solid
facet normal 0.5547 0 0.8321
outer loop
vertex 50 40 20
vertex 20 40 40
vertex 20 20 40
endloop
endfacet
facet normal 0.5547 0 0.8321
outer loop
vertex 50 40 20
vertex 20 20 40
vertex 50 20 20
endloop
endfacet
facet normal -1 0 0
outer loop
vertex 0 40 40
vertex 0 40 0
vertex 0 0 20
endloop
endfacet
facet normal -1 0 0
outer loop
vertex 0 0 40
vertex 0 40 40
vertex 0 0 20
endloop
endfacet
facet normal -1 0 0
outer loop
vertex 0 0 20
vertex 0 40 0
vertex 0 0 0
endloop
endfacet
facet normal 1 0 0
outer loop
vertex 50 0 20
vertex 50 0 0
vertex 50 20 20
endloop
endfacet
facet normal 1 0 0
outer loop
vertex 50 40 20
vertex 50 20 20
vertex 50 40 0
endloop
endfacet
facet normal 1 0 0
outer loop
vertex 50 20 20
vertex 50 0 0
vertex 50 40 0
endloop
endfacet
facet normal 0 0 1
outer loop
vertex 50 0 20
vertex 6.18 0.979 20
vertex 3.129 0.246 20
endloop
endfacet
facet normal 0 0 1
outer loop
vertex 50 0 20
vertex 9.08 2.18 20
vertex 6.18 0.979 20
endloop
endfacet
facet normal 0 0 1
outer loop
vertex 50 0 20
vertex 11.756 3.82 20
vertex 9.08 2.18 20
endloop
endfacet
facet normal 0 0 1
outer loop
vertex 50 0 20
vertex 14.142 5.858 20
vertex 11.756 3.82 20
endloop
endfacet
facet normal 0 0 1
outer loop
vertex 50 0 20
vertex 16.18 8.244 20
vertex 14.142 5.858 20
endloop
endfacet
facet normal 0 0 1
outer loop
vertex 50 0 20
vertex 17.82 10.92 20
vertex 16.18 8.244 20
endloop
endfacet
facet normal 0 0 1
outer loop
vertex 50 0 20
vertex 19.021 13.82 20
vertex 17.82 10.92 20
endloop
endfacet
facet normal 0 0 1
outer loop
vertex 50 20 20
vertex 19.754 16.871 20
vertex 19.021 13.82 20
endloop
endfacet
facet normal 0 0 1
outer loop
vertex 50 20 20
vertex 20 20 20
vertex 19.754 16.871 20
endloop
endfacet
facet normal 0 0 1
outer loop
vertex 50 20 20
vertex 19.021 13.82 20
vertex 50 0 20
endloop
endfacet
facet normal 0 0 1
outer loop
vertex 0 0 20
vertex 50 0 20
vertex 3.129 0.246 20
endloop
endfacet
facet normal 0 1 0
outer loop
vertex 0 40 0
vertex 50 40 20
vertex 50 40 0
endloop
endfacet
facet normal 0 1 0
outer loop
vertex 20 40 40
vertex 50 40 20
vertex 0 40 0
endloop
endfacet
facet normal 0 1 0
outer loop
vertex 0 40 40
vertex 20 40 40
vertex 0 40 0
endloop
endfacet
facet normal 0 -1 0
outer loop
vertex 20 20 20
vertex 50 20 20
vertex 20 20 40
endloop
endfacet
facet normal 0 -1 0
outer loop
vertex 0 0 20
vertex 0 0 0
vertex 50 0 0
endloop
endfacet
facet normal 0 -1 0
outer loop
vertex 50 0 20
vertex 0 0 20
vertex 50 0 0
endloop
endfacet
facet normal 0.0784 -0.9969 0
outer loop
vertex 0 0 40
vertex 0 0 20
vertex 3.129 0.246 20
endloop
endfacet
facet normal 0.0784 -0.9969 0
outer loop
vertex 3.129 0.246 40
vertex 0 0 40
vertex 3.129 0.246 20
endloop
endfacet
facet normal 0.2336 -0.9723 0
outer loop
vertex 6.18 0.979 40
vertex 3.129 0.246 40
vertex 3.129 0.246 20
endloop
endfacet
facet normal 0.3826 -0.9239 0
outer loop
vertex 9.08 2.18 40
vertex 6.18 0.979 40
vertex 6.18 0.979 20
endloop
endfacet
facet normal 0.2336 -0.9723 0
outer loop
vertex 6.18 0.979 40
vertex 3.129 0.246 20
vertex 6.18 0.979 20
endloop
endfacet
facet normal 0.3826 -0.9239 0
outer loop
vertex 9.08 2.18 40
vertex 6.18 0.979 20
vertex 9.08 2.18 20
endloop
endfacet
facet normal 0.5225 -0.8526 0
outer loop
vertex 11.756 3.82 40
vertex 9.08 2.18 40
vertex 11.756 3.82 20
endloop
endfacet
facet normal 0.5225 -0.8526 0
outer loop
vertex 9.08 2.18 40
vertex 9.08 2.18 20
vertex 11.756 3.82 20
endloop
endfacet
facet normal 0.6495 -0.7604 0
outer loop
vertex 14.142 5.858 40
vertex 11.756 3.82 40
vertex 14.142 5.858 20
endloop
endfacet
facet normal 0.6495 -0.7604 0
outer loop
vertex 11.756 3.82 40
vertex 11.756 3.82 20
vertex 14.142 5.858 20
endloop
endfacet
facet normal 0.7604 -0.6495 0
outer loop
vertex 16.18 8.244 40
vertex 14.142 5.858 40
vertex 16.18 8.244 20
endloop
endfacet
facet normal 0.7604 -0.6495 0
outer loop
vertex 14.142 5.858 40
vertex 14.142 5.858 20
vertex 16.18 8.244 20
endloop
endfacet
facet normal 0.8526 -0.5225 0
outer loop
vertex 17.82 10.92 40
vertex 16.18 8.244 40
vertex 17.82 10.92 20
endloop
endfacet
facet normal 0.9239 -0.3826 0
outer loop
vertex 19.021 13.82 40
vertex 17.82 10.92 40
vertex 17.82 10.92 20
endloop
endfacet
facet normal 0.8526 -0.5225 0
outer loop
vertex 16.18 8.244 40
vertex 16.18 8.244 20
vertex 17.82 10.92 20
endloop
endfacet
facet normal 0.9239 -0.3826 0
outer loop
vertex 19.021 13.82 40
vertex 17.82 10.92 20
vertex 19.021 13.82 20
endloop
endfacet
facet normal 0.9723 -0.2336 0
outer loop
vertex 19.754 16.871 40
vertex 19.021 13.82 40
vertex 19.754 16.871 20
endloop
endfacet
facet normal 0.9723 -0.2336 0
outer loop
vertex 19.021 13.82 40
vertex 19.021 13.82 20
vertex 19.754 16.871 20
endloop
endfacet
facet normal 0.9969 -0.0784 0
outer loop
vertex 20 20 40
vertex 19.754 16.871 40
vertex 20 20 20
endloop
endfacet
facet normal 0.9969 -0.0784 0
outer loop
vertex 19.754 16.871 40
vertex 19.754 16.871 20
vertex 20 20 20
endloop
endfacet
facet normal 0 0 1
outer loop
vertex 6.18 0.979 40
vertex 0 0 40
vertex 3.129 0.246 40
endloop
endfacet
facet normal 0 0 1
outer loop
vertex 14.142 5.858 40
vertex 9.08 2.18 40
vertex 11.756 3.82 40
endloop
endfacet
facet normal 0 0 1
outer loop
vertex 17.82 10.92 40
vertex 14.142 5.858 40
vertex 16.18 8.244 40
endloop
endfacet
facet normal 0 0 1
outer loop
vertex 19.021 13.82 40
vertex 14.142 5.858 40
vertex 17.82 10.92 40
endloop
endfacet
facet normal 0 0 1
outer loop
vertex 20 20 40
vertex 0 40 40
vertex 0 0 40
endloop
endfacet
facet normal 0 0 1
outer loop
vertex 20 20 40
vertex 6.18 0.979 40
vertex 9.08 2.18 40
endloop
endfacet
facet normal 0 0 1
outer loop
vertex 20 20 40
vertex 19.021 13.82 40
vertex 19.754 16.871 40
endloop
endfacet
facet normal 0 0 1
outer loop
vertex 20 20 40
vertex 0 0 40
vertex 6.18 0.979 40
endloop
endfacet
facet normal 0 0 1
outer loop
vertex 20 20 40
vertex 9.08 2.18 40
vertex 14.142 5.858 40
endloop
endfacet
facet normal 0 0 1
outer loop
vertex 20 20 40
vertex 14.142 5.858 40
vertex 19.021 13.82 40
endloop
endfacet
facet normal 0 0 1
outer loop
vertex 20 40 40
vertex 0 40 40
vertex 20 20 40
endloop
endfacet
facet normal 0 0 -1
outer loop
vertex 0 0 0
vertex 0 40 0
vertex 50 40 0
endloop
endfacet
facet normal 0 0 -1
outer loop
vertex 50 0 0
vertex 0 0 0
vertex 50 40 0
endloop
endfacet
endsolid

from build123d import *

# Parameters (mm, degrees)
F0_W     = 50
F0_H     = 40
F1_DEPTH = 20
F3_DEPTH = 20
F5_DEPTH = 20


with BuildPart() as f1:
    # F0 (on Top) → F1 (new body)
    with BuildSketch(Plane.XY):
        with Locations((25, 20)):
            Rectangle(F0_W, F0_H)
    extrude(amount=F1_DEPTH)

    # F2 (on face) → F3 (join)
    with BuildSketch(Plane.XY.offset(20)):
        with BuildLine():
            Line((0, 40), (0, 0))
            ThreePointArc((0, 0), (14.142136, 5.857864), (20, 20))
            Line((20, 20), (20, 40))
            Line((20, 40), (0, 40))
        make_face()
    extrude(amount=F3_DEPTH)

    # F4 (on face) → F5 (join)
    with BuildSketch(Plane(origin=(0, 40, 0), x_dir=(-1, 0, 0), z_dir=(0, 1, 0))):
        Polygon((-20, 20), (-20, 40), (-50, 20), align=None)
    extrude(amount=-F5_DEPTH)


solid = f1.part
